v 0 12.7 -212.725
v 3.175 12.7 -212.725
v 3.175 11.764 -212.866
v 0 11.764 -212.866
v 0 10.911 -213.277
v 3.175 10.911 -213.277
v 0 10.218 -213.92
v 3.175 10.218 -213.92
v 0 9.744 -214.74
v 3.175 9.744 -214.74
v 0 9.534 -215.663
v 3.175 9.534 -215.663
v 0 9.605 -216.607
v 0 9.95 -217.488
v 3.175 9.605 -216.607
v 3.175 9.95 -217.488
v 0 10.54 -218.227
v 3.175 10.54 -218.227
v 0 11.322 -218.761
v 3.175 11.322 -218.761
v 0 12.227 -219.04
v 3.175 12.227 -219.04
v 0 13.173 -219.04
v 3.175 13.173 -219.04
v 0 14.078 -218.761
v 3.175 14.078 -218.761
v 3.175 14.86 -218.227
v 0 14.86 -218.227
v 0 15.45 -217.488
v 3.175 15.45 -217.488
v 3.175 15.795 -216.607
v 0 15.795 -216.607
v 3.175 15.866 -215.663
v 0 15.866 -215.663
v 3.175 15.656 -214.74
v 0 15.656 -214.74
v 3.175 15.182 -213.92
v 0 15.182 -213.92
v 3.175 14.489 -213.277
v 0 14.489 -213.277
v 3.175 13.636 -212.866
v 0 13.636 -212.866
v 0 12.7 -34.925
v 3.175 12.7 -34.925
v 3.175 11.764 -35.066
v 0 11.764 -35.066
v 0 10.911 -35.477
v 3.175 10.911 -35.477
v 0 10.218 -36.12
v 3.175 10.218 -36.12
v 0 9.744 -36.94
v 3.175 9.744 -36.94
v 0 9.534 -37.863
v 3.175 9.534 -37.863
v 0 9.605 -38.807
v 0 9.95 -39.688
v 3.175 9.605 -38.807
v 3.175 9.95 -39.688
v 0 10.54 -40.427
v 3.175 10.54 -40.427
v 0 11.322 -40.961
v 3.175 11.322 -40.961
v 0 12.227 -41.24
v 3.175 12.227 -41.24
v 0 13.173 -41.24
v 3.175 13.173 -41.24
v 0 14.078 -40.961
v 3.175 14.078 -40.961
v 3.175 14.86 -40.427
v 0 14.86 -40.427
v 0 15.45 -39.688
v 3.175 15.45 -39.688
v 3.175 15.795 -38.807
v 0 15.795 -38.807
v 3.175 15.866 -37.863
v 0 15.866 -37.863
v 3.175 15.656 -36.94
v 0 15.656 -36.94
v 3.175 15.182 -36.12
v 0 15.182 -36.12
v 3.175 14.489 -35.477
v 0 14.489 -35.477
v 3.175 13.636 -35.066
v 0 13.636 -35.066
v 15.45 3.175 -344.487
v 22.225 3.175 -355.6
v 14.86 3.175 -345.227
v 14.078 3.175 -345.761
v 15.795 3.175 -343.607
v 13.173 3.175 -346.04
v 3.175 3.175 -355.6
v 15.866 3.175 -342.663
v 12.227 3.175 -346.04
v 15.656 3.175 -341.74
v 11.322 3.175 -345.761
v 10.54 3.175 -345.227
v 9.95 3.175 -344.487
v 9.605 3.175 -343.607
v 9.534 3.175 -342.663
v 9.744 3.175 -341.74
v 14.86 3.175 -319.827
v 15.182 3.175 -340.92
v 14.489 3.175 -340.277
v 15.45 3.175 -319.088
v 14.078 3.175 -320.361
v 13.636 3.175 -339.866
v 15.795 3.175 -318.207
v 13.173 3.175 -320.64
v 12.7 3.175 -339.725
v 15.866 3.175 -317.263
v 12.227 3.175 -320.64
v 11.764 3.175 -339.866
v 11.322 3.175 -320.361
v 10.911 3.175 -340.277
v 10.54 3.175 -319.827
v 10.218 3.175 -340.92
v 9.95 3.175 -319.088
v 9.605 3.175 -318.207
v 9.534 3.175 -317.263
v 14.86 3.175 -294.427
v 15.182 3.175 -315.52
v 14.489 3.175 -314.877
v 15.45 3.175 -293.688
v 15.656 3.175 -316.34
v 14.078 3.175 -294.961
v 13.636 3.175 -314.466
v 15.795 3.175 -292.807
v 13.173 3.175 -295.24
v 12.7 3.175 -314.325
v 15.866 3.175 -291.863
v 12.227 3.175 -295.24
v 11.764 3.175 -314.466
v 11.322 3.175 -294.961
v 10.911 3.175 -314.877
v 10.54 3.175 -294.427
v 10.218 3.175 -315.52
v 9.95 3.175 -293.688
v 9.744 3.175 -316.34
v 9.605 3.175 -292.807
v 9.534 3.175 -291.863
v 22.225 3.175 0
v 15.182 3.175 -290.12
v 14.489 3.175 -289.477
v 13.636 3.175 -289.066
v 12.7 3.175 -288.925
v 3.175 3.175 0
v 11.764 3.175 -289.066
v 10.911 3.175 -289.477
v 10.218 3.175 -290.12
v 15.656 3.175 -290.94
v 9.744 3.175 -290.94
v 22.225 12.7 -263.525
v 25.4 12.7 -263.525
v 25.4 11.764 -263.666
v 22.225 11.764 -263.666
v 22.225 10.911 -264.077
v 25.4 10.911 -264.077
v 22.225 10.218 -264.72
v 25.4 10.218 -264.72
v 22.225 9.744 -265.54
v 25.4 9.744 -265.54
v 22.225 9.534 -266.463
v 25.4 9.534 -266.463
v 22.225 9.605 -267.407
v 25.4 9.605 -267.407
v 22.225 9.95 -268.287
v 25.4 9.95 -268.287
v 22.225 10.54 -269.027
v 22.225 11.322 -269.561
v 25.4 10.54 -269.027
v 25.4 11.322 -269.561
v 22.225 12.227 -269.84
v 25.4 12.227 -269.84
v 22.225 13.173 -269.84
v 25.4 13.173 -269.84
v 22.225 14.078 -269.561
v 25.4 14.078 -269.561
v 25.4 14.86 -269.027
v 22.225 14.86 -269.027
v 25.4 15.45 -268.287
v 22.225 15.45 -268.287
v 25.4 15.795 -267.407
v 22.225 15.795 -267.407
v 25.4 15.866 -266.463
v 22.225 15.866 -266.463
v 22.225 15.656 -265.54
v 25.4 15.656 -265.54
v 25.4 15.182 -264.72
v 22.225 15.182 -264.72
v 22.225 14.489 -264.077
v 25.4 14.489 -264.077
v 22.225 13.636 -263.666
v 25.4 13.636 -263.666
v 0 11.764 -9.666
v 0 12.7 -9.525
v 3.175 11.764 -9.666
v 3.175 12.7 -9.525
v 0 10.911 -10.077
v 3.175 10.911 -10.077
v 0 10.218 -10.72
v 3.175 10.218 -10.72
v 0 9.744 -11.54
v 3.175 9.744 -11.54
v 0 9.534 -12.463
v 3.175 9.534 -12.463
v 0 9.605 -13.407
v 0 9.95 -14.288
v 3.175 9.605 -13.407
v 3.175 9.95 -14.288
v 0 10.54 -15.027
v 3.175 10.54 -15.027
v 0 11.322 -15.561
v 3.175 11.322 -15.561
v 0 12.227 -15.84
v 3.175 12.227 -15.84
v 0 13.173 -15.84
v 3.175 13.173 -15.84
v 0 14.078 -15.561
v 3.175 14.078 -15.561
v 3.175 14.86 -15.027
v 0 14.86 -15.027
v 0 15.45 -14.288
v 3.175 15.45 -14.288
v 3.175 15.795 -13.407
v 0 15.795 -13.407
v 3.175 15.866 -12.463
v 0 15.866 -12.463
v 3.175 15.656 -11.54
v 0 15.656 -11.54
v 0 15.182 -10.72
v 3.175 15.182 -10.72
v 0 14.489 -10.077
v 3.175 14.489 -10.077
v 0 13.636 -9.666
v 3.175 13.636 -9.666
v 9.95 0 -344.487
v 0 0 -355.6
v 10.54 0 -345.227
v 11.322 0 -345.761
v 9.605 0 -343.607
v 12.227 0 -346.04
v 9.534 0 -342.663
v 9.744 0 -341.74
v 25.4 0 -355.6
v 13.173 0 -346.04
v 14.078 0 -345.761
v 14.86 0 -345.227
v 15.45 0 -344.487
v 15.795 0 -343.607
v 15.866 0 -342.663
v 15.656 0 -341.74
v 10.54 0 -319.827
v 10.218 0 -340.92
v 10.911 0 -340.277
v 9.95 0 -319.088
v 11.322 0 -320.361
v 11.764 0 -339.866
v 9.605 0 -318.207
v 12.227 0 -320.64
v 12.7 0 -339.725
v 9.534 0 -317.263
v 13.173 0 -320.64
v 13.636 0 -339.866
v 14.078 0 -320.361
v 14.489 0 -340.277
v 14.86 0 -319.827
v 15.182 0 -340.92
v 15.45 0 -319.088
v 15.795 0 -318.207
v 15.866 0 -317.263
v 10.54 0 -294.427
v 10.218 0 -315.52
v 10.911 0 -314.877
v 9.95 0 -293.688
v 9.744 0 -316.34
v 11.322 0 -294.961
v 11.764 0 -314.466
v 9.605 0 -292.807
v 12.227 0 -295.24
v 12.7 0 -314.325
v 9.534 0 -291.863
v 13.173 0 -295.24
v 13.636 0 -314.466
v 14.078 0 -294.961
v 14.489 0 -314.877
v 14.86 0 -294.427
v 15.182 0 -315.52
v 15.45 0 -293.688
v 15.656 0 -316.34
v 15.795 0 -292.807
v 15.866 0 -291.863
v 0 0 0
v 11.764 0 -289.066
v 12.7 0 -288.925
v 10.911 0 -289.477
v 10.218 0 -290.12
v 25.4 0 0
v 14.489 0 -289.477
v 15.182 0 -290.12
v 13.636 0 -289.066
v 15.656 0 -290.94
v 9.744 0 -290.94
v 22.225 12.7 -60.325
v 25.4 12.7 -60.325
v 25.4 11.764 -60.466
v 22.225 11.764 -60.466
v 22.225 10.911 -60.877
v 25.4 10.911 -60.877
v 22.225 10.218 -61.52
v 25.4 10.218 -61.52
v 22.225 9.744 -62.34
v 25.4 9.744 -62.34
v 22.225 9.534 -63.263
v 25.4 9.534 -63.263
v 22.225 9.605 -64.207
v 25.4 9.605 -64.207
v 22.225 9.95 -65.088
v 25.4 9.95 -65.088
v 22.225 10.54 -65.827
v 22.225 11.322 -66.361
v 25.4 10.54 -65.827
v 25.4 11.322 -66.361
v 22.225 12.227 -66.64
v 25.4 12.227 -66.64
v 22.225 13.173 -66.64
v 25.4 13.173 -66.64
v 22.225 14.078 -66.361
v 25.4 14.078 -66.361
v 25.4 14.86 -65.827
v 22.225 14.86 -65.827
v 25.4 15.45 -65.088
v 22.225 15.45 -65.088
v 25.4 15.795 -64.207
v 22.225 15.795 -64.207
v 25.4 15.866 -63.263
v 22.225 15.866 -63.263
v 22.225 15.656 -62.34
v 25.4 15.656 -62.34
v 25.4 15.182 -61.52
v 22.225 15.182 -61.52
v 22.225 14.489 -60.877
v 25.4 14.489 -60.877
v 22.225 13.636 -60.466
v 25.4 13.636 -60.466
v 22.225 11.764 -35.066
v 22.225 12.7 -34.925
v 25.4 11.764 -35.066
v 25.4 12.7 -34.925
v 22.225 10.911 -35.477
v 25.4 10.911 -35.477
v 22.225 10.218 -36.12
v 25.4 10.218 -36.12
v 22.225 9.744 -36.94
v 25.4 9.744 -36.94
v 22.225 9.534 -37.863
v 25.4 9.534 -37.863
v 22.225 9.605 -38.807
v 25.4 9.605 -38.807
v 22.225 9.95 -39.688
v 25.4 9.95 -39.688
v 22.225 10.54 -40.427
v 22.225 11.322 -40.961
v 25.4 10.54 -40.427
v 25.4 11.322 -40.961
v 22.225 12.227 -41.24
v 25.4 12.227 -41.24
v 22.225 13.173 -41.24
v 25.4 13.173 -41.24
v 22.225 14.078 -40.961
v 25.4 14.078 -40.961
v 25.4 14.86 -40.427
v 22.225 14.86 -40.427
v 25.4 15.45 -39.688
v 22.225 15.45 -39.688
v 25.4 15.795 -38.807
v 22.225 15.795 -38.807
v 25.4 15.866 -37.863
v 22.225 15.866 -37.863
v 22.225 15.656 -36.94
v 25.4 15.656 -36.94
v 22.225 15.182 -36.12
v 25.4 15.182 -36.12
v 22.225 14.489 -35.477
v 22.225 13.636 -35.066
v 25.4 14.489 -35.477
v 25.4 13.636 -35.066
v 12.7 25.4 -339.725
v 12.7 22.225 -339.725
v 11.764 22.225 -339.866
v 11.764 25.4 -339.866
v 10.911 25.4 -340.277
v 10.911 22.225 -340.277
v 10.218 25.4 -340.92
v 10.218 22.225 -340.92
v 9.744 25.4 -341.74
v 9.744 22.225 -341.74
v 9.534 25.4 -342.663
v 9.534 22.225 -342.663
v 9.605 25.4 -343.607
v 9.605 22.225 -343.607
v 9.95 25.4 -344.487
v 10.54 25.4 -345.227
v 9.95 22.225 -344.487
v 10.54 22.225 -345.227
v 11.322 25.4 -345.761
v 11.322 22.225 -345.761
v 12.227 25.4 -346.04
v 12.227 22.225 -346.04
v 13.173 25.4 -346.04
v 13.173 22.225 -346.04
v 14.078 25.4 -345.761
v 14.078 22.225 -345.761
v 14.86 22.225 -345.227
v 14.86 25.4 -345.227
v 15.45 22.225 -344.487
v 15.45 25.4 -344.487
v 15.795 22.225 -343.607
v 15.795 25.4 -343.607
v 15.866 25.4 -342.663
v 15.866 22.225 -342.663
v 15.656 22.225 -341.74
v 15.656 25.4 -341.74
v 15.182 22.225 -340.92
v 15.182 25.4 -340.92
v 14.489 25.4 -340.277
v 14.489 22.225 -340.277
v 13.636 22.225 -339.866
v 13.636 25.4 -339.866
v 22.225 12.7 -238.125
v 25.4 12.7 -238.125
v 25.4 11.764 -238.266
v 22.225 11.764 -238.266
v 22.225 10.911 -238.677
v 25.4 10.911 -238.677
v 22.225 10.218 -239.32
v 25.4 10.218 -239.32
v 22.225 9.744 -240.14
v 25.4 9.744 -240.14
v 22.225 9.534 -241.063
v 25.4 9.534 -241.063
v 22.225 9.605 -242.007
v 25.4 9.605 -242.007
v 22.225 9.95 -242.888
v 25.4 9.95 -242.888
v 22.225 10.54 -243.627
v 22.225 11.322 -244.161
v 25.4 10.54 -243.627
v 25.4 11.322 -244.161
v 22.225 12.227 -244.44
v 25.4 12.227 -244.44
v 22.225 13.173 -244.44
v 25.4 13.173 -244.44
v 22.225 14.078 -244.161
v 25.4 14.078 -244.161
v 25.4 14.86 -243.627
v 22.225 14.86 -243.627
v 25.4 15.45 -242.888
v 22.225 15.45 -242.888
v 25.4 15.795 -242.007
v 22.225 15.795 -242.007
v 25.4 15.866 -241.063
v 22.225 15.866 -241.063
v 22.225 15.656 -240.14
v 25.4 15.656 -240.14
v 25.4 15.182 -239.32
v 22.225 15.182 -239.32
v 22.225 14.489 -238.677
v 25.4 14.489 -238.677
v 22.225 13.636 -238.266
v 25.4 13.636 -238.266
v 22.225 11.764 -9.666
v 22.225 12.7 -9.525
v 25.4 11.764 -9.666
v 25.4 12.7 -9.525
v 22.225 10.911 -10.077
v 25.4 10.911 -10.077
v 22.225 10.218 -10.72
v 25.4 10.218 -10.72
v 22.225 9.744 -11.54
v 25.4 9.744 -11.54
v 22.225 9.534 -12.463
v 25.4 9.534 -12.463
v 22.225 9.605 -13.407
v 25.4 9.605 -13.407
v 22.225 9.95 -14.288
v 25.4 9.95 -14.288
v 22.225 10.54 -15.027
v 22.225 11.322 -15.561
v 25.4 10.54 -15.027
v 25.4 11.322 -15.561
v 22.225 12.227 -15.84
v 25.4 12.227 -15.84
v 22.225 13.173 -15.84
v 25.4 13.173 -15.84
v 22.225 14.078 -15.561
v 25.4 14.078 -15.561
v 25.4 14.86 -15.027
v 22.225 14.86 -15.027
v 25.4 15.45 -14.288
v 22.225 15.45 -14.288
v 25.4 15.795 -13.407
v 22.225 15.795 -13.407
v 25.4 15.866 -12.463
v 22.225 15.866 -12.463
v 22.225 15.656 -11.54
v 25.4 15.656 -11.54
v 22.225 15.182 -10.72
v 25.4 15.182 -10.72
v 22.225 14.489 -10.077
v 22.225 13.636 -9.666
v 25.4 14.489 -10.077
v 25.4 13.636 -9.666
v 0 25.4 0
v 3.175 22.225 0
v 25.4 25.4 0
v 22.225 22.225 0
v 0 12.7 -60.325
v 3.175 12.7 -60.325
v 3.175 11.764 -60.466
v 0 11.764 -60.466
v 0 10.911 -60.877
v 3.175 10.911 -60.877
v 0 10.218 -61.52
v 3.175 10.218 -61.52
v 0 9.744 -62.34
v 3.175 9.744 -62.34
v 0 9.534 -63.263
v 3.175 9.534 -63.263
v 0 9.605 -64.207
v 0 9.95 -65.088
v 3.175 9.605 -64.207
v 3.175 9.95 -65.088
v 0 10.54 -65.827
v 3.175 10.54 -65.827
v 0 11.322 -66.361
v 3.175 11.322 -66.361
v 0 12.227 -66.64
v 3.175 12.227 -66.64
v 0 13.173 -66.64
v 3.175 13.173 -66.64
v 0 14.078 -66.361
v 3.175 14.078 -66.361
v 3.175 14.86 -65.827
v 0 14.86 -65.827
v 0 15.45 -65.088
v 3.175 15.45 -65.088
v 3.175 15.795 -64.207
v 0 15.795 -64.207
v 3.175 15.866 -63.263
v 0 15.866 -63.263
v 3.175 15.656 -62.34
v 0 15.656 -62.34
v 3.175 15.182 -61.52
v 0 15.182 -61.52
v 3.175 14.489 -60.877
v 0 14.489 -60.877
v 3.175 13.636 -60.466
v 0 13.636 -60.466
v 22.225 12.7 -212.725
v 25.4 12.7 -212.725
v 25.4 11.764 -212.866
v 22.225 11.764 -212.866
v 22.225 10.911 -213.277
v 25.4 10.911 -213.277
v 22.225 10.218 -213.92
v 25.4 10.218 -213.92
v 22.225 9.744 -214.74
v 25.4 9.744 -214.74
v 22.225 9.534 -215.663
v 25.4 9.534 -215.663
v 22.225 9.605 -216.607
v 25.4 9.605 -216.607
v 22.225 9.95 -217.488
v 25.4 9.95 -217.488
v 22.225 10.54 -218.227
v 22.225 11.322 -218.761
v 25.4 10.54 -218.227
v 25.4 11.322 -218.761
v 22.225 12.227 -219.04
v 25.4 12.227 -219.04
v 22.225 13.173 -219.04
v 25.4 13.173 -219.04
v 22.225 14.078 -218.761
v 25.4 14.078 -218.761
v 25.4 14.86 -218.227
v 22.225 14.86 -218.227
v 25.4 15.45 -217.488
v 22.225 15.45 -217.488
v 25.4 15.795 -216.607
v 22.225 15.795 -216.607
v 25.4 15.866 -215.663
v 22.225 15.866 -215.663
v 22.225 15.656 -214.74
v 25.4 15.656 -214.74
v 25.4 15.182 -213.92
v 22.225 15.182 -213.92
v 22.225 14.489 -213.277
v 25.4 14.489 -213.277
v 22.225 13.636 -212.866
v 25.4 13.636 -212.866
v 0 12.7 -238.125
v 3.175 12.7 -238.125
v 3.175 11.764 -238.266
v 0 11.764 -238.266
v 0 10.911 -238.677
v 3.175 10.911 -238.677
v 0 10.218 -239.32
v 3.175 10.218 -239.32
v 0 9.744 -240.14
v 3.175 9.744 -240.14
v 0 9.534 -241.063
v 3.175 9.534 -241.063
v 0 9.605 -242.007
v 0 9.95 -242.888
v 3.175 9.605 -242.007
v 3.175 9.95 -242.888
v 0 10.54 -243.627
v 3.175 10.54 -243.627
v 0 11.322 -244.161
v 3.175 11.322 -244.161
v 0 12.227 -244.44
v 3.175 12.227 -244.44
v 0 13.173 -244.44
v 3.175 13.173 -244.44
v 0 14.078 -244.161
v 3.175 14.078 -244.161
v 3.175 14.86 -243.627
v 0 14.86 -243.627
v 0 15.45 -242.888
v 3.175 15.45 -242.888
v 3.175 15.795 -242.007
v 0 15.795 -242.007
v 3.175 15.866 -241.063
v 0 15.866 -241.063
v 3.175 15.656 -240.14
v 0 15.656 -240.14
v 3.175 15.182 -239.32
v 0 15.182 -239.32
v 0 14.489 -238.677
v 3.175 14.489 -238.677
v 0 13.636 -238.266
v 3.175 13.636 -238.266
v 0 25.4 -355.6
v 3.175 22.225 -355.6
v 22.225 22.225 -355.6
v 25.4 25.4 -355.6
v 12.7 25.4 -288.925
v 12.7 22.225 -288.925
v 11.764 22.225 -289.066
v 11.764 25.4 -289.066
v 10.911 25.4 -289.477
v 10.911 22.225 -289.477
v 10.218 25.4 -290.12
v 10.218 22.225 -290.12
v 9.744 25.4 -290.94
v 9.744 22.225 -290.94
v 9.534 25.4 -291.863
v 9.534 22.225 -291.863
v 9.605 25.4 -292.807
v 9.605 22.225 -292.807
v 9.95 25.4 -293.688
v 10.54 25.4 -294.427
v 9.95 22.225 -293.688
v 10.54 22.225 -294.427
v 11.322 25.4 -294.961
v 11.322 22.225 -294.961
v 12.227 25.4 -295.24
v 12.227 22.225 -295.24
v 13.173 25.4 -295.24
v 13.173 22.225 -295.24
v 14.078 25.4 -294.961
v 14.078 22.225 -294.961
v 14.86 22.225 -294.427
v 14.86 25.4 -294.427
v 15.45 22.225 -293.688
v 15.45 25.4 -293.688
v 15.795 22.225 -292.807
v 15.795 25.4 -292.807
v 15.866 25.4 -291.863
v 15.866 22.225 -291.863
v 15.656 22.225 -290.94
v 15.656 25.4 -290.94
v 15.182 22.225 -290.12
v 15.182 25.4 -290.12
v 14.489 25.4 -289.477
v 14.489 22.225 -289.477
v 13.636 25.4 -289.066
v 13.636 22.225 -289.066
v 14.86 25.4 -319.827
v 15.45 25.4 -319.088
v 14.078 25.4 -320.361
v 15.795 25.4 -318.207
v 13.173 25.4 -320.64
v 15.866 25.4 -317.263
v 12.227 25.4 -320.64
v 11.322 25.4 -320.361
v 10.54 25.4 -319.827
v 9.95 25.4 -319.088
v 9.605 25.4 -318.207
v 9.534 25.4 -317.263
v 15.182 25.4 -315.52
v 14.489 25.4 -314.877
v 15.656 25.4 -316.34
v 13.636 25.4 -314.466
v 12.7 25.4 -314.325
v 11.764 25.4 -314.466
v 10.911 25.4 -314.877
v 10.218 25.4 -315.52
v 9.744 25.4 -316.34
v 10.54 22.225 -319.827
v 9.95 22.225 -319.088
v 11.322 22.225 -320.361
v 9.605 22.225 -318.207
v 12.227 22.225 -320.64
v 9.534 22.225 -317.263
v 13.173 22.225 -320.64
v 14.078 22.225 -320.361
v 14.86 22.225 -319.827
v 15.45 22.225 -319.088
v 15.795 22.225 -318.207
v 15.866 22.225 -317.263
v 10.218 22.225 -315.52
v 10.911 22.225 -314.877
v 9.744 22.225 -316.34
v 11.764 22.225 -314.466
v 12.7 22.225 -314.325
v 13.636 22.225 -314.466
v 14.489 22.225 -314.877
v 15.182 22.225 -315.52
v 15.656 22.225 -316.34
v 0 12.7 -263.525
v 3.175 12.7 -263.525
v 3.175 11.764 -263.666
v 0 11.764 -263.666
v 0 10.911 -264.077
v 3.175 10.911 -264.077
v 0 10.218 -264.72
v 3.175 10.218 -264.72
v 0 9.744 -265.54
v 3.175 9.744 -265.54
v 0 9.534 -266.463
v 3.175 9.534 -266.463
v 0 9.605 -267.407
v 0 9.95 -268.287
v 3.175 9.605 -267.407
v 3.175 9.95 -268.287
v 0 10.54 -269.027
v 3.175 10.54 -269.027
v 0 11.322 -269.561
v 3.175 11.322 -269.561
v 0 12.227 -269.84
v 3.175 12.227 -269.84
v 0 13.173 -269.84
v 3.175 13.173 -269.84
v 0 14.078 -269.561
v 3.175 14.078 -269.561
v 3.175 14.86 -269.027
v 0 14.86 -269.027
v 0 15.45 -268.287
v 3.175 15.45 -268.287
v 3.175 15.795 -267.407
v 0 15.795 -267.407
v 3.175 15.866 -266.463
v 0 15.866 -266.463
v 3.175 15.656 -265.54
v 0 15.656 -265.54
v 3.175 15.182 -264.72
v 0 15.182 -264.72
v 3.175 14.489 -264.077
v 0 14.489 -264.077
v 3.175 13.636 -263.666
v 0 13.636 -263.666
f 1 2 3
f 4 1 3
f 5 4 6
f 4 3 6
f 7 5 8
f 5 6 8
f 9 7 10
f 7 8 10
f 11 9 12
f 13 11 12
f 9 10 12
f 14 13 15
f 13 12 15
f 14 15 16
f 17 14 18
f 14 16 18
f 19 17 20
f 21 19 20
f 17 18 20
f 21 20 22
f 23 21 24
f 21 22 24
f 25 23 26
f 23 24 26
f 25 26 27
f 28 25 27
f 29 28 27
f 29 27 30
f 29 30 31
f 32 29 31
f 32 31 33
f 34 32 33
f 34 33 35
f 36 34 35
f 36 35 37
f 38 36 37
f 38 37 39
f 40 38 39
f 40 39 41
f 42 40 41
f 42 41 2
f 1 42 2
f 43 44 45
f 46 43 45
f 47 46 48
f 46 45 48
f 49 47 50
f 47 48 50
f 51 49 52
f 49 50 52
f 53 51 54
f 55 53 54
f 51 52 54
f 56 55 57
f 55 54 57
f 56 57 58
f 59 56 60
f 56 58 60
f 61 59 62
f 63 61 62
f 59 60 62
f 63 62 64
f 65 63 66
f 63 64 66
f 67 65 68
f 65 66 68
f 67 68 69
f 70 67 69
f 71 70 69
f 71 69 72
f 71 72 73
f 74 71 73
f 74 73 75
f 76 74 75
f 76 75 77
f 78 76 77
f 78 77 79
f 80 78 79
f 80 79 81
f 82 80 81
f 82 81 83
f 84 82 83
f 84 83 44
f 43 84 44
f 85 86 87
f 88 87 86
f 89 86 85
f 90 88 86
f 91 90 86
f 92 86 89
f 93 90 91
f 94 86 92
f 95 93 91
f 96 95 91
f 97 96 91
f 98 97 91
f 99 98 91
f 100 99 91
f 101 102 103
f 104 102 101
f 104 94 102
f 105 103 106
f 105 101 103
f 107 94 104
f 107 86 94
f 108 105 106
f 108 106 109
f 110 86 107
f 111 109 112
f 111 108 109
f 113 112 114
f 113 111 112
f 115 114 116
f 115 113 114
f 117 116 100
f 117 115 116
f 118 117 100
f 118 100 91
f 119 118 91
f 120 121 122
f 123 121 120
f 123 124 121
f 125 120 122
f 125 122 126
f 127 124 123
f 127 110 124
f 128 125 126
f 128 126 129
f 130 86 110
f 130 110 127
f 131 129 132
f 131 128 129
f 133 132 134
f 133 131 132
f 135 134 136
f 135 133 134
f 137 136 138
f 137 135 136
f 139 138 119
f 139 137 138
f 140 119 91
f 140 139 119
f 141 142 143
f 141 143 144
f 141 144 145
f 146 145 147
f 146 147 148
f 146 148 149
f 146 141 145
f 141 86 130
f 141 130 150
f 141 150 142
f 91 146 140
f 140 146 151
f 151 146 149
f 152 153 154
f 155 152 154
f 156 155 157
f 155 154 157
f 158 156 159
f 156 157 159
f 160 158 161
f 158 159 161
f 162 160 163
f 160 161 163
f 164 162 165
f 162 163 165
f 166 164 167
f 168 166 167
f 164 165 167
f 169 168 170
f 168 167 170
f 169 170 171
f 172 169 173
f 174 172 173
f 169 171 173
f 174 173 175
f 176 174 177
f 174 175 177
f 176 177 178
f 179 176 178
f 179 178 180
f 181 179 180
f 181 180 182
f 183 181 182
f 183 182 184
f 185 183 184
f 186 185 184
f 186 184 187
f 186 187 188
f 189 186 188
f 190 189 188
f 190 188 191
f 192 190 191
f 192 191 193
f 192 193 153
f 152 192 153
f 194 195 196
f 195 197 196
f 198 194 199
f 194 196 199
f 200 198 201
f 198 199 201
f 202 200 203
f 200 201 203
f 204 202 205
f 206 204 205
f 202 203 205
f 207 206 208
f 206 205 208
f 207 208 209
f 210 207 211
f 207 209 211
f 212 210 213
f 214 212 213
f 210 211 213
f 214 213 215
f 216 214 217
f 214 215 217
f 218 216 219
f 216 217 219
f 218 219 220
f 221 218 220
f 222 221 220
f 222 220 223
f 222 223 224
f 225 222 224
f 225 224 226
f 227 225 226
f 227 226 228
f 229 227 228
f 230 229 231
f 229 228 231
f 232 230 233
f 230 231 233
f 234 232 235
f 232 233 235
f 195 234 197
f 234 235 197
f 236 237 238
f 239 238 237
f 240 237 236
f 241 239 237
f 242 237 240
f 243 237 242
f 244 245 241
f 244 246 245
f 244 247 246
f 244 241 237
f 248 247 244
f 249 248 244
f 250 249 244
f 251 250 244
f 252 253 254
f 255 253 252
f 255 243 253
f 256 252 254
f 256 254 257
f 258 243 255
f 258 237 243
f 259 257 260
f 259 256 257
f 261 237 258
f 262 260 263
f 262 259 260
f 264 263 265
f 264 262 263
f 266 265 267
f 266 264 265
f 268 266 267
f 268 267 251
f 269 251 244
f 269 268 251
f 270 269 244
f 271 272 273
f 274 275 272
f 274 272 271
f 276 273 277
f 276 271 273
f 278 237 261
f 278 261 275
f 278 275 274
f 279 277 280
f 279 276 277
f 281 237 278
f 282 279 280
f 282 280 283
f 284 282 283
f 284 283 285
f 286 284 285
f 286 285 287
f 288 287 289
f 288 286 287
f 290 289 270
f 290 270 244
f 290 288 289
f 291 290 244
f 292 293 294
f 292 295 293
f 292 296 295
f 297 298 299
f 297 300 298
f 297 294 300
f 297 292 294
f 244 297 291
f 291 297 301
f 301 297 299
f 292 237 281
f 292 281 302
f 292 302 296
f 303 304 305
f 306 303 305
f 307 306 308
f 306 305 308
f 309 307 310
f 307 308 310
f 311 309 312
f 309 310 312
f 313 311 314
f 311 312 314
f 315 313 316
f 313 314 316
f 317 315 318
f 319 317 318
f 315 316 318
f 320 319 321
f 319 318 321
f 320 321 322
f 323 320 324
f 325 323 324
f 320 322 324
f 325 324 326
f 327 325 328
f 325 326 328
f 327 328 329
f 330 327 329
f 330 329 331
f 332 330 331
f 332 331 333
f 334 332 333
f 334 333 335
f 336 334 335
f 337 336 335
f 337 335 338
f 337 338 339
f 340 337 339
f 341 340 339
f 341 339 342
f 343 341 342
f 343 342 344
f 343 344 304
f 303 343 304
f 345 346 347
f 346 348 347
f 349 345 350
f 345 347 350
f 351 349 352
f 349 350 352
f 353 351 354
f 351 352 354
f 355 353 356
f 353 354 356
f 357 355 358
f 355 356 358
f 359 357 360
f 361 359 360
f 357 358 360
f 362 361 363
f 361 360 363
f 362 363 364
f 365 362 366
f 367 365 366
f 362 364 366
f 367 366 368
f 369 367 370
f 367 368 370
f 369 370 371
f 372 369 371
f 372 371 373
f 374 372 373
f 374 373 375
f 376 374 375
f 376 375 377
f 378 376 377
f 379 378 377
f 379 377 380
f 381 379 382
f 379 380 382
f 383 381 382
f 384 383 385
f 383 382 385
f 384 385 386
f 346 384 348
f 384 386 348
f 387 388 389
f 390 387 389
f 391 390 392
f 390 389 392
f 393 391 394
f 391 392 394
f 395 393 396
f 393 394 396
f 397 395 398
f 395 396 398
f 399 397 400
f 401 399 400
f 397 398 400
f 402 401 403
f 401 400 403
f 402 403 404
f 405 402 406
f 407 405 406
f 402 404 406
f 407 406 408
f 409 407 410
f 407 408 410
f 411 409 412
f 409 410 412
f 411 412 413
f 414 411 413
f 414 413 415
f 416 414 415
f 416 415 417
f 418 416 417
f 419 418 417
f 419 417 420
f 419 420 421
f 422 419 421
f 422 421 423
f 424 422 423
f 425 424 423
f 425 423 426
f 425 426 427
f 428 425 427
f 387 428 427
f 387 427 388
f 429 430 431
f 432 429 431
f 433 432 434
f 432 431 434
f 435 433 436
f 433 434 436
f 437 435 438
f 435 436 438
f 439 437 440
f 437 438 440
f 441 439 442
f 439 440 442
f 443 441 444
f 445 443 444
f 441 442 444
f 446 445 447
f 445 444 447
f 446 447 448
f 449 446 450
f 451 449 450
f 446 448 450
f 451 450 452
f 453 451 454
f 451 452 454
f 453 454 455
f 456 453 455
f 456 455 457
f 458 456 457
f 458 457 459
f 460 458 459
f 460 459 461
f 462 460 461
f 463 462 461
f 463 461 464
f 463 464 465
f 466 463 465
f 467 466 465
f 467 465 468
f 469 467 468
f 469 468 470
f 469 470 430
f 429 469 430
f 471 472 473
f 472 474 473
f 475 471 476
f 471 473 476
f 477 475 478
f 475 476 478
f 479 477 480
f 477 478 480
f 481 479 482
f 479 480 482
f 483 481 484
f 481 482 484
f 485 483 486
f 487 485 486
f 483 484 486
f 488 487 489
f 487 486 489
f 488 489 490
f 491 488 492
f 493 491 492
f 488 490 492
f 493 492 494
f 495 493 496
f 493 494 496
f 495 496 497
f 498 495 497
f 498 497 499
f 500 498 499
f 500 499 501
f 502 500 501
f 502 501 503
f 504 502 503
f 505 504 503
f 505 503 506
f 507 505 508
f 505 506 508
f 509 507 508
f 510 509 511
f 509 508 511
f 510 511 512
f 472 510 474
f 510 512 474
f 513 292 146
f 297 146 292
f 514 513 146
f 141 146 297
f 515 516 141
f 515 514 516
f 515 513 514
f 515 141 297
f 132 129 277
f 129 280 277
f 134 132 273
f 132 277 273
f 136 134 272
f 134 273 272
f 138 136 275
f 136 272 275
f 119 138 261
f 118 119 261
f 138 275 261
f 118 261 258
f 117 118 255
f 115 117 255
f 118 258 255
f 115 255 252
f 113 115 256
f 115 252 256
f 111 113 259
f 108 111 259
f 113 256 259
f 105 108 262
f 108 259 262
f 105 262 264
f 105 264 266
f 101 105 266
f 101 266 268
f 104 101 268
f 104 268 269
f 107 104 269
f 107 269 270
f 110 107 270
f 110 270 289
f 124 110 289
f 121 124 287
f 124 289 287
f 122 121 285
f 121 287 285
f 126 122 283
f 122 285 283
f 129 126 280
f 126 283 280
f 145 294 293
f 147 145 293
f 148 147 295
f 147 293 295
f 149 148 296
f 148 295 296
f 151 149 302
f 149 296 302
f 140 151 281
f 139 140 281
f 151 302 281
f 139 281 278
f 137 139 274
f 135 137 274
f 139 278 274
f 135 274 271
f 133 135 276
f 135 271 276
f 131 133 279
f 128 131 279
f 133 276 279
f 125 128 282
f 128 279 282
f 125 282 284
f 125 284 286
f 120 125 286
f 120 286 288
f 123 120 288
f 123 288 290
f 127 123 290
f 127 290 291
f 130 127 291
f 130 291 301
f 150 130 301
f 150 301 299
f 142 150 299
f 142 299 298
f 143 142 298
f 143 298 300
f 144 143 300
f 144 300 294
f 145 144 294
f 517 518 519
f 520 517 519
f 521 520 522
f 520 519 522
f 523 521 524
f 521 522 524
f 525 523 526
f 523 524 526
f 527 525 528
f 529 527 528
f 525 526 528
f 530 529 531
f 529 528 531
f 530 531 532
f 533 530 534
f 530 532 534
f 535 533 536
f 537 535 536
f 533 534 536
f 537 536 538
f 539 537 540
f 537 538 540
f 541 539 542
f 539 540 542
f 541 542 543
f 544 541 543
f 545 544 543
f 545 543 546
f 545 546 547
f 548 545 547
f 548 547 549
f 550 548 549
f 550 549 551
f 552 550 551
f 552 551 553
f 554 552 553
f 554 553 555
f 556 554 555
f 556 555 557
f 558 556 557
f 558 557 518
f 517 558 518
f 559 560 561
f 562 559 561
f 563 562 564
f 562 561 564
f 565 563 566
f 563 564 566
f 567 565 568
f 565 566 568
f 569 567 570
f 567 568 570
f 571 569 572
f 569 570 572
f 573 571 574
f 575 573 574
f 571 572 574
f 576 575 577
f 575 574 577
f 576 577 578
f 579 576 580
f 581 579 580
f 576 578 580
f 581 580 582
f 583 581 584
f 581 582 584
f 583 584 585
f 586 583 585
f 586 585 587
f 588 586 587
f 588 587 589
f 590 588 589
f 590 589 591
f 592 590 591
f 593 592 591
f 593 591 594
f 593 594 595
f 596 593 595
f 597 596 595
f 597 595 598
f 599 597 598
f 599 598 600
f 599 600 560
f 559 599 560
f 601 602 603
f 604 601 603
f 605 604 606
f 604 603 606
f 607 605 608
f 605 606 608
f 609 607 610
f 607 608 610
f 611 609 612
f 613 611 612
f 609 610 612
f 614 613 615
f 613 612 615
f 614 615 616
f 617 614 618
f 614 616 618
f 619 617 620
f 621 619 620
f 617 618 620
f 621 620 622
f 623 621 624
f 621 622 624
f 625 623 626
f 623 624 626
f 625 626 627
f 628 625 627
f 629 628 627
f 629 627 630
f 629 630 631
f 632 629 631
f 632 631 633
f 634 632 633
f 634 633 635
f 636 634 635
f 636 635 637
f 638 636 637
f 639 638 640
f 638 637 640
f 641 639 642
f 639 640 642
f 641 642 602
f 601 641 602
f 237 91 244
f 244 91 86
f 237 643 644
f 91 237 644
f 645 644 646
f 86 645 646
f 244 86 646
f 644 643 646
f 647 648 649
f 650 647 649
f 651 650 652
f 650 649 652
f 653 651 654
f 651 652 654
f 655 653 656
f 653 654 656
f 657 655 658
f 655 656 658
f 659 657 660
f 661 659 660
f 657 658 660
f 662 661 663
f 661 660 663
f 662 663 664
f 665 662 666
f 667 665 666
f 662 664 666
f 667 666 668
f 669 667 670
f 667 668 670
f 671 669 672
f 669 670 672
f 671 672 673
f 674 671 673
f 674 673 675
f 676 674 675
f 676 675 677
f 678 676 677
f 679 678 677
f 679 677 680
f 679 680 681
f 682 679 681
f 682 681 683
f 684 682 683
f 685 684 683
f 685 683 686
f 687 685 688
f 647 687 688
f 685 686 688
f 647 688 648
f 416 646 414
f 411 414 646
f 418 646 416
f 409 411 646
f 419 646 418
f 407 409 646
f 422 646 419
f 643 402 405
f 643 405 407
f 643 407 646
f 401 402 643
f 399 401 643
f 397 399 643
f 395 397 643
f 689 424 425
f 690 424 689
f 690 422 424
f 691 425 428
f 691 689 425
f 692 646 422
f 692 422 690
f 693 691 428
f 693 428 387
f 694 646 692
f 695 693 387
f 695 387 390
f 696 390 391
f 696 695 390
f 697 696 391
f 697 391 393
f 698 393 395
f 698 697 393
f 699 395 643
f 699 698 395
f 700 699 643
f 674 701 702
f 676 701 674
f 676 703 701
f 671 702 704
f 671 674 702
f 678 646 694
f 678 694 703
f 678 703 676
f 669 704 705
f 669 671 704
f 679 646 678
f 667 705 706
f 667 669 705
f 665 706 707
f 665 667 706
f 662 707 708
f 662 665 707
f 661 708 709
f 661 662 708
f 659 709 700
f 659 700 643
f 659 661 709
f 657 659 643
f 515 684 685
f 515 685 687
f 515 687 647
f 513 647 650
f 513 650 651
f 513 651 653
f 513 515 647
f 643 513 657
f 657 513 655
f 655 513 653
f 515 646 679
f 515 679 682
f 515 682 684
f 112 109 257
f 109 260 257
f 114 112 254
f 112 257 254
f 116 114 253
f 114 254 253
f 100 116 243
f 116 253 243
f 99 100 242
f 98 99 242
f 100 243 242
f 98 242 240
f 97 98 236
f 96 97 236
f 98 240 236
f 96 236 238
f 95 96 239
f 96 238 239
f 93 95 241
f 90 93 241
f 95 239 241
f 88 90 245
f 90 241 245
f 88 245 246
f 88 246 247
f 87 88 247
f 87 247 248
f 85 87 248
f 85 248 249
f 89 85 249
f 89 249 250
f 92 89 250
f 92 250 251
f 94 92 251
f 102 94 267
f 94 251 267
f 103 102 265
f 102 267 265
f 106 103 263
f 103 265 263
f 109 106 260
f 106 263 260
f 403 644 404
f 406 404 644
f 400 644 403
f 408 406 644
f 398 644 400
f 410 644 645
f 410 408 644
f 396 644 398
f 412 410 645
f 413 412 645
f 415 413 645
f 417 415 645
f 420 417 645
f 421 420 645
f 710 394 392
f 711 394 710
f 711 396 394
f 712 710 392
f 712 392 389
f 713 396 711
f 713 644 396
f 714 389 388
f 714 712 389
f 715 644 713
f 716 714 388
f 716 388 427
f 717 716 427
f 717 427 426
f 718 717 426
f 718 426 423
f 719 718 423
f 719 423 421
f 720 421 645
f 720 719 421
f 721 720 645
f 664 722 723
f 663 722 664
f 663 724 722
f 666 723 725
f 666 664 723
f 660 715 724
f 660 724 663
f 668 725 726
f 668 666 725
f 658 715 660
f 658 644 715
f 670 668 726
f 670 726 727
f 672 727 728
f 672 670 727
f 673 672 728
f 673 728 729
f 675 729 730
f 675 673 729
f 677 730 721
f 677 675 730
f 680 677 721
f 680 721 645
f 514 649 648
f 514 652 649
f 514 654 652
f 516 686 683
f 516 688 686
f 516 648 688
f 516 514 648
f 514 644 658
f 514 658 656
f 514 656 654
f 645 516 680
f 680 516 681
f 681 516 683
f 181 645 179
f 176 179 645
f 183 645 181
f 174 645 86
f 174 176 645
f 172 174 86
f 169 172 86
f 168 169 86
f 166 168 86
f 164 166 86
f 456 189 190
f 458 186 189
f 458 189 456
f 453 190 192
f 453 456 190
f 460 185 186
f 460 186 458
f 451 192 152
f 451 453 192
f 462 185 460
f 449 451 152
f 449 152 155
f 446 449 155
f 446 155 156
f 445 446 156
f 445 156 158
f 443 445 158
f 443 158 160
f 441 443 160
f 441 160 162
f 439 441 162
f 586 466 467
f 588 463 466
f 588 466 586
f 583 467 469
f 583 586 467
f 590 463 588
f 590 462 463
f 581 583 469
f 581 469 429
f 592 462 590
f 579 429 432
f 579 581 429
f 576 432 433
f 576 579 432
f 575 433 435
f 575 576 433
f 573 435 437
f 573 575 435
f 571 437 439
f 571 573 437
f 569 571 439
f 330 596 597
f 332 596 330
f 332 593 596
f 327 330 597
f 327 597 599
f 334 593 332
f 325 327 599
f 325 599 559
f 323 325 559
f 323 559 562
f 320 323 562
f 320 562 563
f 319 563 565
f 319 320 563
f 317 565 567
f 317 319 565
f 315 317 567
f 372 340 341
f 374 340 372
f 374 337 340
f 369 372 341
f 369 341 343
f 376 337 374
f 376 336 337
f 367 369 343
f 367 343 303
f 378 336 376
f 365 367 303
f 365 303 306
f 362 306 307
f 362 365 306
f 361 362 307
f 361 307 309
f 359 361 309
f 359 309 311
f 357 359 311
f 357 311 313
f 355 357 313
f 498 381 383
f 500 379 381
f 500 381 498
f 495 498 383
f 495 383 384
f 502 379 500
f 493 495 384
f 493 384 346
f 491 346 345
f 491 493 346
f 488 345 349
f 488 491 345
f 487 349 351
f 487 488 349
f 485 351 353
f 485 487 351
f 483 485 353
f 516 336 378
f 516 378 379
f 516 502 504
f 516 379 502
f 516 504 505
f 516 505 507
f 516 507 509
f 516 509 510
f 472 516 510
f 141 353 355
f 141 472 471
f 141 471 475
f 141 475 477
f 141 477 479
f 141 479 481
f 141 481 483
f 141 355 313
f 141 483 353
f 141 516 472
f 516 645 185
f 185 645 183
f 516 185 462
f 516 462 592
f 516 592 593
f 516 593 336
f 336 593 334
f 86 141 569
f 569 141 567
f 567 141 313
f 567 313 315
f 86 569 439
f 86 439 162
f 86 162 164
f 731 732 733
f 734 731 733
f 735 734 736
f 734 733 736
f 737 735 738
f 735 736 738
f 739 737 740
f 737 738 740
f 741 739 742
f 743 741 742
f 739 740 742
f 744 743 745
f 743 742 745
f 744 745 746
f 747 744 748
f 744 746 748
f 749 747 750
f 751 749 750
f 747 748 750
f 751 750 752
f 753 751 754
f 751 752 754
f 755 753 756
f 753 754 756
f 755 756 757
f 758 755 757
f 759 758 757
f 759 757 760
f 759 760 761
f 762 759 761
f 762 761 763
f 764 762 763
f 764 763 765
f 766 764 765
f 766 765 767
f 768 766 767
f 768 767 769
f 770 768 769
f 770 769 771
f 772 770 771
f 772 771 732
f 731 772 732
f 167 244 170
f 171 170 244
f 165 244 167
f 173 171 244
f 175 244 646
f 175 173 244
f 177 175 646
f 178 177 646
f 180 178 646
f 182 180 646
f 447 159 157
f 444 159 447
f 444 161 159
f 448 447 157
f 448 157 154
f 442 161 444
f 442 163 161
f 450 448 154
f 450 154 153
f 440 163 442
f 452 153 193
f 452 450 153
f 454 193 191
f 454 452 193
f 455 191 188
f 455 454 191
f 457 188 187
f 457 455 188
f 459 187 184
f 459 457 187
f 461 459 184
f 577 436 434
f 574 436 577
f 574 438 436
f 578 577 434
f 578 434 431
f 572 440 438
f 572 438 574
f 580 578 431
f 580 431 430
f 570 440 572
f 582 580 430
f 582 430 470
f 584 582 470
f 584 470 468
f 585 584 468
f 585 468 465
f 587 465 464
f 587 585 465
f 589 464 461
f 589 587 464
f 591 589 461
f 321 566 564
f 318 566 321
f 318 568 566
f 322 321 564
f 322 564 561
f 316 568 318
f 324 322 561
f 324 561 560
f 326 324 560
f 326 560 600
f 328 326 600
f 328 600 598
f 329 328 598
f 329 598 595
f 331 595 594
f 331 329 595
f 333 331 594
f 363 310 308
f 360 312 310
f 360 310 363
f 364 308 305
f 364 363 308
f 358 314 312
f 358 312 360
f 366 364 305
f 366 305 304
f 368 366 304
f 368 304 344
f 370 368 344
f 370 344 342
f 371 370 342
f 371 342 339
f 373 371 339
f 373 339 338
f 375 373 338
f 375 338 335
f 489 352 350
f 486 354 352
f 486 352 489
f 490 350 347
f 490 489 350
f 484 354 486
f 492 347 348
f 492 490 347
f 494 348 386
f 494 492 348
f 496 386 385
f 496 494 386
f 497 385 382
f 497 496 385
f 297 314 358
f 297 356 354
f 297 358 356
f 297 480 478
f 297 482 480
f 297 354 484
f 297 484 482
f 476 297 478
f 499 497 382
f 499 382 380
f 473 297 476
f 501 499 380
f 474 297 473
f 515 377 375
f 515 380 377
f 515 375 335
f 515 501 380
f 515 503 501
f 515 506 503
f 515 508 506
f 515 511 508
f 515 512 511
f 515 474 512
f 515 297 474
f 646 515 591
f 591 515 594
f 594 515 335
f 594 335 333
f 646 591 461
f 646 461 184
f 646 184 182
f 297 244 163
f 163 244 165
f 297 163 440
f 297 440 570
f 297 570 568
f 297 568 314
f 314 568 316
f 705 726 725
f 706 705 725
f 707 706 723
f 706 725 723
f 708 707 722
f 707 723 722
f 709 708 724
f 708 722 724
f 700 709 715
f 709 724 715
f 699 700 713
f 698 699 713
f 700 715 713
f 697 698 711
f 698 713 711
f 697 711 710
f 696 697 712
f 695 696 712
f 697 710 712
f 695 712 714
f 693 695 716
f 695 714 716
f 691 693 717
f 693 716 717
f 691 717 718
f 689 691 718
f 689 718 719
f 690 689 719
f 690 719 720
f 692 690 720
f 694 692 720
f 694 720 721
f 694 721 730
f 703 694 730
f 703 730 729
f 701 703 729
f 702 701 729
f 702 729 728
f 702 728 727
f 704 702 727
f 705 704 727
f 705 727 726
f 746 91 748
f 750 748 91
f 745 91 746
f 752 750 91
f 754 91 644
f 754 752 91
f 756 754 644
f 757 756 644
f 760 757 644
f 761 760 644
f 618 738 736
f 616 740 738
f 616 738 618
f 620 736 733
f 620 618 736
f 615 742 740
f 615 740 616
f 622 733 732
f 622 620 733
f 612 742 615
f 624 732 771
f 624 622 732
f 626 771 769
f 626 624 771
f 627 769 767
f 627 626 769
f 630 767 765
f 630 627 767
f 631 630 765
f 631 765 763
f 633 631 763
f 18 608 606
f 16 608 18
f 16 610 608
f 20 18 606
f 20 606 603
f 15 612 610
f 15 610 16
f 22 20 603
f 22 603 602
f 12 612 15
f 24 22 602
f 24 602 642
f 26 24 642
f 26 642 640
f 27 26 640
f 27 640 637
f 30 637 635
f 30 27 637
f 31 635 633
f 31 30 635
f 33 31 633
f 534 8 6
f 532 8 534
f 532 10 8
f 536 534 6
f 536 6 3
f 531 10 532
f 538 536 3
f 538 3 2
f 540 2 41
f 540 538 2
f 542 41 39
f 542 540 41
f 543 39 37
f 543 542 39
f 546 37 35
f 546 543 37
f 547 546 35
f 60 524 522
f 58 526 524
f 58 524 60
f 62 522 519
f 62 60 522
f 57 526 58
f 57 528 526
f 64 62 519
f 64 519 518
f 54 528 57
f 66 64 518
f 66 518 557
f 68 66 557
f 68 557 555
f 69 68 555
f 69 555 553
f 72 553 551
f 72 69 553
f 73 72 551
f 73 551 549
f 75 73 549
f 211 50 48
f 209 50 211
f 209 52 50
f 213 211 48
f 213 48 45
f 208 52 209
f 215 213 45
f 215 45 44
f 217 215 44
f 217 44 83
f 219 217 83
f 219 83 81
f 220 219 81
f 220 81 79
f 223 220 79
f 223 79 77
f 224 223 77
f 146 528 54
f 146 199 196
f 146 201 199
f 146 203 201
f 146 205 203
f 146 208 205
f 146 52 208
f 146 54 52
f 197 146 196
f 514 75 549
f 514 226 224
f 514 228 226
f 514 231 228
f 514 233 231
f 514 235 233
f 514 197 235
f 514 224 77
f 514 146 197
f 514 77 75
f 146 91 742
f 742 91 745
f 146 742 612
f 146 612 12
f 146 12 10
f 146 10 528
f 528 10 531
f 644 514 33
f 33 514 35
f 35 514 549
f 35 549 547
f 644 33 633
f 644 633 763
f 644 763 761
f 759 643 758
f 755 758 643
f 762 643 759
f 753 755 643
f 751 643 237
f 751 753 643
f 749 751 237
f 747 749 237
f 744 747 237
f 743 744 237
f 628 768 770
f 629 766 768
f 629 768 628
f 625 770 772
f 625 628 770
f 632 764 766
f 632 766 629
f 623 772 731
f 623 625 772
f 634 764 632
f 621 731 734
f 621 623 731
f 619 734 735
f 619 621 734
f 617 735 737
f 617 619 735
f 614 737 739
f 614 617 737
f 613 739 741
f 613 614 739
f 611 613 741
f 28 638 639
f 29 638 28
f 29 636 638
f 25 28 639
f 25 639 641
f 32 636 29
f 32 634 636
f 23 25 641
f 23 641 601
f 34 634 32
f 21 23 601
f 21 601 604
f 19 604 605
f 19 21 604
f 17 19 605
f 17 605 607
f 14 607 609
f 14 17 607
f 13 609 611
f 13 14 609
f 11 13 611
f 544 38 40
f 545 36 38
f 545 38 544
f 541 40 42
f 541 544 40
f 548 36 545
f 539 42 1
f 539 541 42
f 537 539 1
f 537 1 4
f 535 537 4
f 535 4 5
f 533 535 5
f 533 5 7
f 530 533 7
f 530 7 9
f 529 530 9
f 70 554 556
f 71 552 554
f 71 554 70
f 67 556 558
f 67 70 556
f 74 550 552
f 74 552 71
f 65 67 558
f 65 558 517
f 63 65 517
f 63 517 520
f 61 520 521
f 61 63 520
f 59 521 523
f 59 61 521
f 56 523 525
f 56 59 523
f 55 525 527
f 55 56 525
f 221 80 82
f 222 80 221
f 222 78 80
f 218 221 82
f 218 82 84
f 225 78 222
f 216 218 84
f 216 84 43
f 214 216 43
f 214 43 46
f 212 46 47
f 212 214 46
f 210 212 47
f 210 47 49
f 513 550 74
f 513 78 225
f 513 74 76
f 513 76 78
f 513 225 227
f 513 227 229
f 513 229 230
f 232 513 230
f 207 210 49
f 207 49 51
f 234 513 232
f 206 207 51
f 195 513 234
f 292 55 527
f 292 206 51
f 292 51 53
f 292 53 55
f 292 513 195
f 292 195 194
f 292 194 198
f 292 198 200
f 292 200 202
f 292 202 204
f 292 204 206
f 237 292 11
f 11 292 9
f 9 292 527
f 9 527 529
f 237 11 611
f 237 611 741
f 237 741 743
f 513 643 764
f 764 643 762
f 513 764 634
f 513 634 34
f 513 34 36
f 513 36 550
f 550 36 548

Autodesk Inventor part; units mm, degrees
ref_plane "YZ Plane" through (0, 0, 0) normal (1, 0, 0) x (0, 1, 0)
ref_plane "XZ Plane" through (0, 0, 0) normal (0, 1, 0) x (-1, 0, 0)
ref_plane "XY Plane" through (0, 0, 0) normal (0, 0, 1) x (1, 0, 0)
sketch "Sketch1" plane through (0, 0, 0) normal (0, 0, 1) x (1, 0, 0)
  line L0 (0, 0) -> (25.4, 0)
  line L1 (25.4, 0) -> (25.4, 25.4)
  line L2 (25.4, 25.4) -> (0, 25.4)
  line L3 (0, 25.4) -> (0, 0)
  line L4 (3.175, 22.225) -> (22.225, 22.225)
  line L5 (22.225, 22.225) -> (22.225, 3.175)
  line L6 (22.225, 3.175) -> (3.175, 3.175)
  line L7 (3.175, 3.175) -> (3.175, 22.225)
  dimension "d0" = 25.4
  dimension "d1" = 25.4
  dimension "d2" = 3.175
extrude "Extrusion1" add sketch "Sketch1" against normal blind 355.6
sketch "Sketch2" plane through (0, 0, 0) normal (-1, 0, 0) x (0, 0, 1)
  line L0 (-355.6, 25.4) -> (-355.6, 0) projected
  line L1 (0, 25.4) -> (0, 0) projected
  point P0 (-266.7, 12.7)
  point P1 (-241.3, 12.7)
  point P2 (-215.9, 12.7)
  point P3 (-12.7, 12.7)
  point P4 (-38.1, 12.7)
  point P5 (-63.5, 12.7)
  dimension "d5" = 88.9
  dimension "d6" = 25.4
  dimension "d7" = 25.4
  dimension "d8" = 25.4
  dimension "d9" = 25.4
  dimension "d10" = 12.7
hole "Hole1" at (0, 12.7, -266.7) at (0, 12.7, -241.3) at (0, 12.7, -215.9) at (0, 12.7, -12.7) at (0, 12.7, -38.1) at (0, 12.7, -63.5) direction (1, 0, 0) diameter 6.35 depth 25.4 tip angle 118
sketch "Sketch3" plane through (0, 25.4, 0) normal (0, 1, 0) x (1, 0, 0)
  line L0 (25.4, 355.6) -> (0, 355.6) projected
  point P0 (12.7, 342.9)
  point P1 (12.7, 317.5)
  point P2 (12.7, 292.1)
  dimension "d18" = 25.4
  dimension "d19" = 25.4
  dimension "d20" = 12.7
hole "Hole2" at (12.7, 25.4, -342.9) at (12.7, 25.4, -317.5) at (12.7, 25.4, -292.1) direction (0, -1, 0) diameter 6.35 depth 25.4 tip angle 118
properties part number "10 inch side piece"
